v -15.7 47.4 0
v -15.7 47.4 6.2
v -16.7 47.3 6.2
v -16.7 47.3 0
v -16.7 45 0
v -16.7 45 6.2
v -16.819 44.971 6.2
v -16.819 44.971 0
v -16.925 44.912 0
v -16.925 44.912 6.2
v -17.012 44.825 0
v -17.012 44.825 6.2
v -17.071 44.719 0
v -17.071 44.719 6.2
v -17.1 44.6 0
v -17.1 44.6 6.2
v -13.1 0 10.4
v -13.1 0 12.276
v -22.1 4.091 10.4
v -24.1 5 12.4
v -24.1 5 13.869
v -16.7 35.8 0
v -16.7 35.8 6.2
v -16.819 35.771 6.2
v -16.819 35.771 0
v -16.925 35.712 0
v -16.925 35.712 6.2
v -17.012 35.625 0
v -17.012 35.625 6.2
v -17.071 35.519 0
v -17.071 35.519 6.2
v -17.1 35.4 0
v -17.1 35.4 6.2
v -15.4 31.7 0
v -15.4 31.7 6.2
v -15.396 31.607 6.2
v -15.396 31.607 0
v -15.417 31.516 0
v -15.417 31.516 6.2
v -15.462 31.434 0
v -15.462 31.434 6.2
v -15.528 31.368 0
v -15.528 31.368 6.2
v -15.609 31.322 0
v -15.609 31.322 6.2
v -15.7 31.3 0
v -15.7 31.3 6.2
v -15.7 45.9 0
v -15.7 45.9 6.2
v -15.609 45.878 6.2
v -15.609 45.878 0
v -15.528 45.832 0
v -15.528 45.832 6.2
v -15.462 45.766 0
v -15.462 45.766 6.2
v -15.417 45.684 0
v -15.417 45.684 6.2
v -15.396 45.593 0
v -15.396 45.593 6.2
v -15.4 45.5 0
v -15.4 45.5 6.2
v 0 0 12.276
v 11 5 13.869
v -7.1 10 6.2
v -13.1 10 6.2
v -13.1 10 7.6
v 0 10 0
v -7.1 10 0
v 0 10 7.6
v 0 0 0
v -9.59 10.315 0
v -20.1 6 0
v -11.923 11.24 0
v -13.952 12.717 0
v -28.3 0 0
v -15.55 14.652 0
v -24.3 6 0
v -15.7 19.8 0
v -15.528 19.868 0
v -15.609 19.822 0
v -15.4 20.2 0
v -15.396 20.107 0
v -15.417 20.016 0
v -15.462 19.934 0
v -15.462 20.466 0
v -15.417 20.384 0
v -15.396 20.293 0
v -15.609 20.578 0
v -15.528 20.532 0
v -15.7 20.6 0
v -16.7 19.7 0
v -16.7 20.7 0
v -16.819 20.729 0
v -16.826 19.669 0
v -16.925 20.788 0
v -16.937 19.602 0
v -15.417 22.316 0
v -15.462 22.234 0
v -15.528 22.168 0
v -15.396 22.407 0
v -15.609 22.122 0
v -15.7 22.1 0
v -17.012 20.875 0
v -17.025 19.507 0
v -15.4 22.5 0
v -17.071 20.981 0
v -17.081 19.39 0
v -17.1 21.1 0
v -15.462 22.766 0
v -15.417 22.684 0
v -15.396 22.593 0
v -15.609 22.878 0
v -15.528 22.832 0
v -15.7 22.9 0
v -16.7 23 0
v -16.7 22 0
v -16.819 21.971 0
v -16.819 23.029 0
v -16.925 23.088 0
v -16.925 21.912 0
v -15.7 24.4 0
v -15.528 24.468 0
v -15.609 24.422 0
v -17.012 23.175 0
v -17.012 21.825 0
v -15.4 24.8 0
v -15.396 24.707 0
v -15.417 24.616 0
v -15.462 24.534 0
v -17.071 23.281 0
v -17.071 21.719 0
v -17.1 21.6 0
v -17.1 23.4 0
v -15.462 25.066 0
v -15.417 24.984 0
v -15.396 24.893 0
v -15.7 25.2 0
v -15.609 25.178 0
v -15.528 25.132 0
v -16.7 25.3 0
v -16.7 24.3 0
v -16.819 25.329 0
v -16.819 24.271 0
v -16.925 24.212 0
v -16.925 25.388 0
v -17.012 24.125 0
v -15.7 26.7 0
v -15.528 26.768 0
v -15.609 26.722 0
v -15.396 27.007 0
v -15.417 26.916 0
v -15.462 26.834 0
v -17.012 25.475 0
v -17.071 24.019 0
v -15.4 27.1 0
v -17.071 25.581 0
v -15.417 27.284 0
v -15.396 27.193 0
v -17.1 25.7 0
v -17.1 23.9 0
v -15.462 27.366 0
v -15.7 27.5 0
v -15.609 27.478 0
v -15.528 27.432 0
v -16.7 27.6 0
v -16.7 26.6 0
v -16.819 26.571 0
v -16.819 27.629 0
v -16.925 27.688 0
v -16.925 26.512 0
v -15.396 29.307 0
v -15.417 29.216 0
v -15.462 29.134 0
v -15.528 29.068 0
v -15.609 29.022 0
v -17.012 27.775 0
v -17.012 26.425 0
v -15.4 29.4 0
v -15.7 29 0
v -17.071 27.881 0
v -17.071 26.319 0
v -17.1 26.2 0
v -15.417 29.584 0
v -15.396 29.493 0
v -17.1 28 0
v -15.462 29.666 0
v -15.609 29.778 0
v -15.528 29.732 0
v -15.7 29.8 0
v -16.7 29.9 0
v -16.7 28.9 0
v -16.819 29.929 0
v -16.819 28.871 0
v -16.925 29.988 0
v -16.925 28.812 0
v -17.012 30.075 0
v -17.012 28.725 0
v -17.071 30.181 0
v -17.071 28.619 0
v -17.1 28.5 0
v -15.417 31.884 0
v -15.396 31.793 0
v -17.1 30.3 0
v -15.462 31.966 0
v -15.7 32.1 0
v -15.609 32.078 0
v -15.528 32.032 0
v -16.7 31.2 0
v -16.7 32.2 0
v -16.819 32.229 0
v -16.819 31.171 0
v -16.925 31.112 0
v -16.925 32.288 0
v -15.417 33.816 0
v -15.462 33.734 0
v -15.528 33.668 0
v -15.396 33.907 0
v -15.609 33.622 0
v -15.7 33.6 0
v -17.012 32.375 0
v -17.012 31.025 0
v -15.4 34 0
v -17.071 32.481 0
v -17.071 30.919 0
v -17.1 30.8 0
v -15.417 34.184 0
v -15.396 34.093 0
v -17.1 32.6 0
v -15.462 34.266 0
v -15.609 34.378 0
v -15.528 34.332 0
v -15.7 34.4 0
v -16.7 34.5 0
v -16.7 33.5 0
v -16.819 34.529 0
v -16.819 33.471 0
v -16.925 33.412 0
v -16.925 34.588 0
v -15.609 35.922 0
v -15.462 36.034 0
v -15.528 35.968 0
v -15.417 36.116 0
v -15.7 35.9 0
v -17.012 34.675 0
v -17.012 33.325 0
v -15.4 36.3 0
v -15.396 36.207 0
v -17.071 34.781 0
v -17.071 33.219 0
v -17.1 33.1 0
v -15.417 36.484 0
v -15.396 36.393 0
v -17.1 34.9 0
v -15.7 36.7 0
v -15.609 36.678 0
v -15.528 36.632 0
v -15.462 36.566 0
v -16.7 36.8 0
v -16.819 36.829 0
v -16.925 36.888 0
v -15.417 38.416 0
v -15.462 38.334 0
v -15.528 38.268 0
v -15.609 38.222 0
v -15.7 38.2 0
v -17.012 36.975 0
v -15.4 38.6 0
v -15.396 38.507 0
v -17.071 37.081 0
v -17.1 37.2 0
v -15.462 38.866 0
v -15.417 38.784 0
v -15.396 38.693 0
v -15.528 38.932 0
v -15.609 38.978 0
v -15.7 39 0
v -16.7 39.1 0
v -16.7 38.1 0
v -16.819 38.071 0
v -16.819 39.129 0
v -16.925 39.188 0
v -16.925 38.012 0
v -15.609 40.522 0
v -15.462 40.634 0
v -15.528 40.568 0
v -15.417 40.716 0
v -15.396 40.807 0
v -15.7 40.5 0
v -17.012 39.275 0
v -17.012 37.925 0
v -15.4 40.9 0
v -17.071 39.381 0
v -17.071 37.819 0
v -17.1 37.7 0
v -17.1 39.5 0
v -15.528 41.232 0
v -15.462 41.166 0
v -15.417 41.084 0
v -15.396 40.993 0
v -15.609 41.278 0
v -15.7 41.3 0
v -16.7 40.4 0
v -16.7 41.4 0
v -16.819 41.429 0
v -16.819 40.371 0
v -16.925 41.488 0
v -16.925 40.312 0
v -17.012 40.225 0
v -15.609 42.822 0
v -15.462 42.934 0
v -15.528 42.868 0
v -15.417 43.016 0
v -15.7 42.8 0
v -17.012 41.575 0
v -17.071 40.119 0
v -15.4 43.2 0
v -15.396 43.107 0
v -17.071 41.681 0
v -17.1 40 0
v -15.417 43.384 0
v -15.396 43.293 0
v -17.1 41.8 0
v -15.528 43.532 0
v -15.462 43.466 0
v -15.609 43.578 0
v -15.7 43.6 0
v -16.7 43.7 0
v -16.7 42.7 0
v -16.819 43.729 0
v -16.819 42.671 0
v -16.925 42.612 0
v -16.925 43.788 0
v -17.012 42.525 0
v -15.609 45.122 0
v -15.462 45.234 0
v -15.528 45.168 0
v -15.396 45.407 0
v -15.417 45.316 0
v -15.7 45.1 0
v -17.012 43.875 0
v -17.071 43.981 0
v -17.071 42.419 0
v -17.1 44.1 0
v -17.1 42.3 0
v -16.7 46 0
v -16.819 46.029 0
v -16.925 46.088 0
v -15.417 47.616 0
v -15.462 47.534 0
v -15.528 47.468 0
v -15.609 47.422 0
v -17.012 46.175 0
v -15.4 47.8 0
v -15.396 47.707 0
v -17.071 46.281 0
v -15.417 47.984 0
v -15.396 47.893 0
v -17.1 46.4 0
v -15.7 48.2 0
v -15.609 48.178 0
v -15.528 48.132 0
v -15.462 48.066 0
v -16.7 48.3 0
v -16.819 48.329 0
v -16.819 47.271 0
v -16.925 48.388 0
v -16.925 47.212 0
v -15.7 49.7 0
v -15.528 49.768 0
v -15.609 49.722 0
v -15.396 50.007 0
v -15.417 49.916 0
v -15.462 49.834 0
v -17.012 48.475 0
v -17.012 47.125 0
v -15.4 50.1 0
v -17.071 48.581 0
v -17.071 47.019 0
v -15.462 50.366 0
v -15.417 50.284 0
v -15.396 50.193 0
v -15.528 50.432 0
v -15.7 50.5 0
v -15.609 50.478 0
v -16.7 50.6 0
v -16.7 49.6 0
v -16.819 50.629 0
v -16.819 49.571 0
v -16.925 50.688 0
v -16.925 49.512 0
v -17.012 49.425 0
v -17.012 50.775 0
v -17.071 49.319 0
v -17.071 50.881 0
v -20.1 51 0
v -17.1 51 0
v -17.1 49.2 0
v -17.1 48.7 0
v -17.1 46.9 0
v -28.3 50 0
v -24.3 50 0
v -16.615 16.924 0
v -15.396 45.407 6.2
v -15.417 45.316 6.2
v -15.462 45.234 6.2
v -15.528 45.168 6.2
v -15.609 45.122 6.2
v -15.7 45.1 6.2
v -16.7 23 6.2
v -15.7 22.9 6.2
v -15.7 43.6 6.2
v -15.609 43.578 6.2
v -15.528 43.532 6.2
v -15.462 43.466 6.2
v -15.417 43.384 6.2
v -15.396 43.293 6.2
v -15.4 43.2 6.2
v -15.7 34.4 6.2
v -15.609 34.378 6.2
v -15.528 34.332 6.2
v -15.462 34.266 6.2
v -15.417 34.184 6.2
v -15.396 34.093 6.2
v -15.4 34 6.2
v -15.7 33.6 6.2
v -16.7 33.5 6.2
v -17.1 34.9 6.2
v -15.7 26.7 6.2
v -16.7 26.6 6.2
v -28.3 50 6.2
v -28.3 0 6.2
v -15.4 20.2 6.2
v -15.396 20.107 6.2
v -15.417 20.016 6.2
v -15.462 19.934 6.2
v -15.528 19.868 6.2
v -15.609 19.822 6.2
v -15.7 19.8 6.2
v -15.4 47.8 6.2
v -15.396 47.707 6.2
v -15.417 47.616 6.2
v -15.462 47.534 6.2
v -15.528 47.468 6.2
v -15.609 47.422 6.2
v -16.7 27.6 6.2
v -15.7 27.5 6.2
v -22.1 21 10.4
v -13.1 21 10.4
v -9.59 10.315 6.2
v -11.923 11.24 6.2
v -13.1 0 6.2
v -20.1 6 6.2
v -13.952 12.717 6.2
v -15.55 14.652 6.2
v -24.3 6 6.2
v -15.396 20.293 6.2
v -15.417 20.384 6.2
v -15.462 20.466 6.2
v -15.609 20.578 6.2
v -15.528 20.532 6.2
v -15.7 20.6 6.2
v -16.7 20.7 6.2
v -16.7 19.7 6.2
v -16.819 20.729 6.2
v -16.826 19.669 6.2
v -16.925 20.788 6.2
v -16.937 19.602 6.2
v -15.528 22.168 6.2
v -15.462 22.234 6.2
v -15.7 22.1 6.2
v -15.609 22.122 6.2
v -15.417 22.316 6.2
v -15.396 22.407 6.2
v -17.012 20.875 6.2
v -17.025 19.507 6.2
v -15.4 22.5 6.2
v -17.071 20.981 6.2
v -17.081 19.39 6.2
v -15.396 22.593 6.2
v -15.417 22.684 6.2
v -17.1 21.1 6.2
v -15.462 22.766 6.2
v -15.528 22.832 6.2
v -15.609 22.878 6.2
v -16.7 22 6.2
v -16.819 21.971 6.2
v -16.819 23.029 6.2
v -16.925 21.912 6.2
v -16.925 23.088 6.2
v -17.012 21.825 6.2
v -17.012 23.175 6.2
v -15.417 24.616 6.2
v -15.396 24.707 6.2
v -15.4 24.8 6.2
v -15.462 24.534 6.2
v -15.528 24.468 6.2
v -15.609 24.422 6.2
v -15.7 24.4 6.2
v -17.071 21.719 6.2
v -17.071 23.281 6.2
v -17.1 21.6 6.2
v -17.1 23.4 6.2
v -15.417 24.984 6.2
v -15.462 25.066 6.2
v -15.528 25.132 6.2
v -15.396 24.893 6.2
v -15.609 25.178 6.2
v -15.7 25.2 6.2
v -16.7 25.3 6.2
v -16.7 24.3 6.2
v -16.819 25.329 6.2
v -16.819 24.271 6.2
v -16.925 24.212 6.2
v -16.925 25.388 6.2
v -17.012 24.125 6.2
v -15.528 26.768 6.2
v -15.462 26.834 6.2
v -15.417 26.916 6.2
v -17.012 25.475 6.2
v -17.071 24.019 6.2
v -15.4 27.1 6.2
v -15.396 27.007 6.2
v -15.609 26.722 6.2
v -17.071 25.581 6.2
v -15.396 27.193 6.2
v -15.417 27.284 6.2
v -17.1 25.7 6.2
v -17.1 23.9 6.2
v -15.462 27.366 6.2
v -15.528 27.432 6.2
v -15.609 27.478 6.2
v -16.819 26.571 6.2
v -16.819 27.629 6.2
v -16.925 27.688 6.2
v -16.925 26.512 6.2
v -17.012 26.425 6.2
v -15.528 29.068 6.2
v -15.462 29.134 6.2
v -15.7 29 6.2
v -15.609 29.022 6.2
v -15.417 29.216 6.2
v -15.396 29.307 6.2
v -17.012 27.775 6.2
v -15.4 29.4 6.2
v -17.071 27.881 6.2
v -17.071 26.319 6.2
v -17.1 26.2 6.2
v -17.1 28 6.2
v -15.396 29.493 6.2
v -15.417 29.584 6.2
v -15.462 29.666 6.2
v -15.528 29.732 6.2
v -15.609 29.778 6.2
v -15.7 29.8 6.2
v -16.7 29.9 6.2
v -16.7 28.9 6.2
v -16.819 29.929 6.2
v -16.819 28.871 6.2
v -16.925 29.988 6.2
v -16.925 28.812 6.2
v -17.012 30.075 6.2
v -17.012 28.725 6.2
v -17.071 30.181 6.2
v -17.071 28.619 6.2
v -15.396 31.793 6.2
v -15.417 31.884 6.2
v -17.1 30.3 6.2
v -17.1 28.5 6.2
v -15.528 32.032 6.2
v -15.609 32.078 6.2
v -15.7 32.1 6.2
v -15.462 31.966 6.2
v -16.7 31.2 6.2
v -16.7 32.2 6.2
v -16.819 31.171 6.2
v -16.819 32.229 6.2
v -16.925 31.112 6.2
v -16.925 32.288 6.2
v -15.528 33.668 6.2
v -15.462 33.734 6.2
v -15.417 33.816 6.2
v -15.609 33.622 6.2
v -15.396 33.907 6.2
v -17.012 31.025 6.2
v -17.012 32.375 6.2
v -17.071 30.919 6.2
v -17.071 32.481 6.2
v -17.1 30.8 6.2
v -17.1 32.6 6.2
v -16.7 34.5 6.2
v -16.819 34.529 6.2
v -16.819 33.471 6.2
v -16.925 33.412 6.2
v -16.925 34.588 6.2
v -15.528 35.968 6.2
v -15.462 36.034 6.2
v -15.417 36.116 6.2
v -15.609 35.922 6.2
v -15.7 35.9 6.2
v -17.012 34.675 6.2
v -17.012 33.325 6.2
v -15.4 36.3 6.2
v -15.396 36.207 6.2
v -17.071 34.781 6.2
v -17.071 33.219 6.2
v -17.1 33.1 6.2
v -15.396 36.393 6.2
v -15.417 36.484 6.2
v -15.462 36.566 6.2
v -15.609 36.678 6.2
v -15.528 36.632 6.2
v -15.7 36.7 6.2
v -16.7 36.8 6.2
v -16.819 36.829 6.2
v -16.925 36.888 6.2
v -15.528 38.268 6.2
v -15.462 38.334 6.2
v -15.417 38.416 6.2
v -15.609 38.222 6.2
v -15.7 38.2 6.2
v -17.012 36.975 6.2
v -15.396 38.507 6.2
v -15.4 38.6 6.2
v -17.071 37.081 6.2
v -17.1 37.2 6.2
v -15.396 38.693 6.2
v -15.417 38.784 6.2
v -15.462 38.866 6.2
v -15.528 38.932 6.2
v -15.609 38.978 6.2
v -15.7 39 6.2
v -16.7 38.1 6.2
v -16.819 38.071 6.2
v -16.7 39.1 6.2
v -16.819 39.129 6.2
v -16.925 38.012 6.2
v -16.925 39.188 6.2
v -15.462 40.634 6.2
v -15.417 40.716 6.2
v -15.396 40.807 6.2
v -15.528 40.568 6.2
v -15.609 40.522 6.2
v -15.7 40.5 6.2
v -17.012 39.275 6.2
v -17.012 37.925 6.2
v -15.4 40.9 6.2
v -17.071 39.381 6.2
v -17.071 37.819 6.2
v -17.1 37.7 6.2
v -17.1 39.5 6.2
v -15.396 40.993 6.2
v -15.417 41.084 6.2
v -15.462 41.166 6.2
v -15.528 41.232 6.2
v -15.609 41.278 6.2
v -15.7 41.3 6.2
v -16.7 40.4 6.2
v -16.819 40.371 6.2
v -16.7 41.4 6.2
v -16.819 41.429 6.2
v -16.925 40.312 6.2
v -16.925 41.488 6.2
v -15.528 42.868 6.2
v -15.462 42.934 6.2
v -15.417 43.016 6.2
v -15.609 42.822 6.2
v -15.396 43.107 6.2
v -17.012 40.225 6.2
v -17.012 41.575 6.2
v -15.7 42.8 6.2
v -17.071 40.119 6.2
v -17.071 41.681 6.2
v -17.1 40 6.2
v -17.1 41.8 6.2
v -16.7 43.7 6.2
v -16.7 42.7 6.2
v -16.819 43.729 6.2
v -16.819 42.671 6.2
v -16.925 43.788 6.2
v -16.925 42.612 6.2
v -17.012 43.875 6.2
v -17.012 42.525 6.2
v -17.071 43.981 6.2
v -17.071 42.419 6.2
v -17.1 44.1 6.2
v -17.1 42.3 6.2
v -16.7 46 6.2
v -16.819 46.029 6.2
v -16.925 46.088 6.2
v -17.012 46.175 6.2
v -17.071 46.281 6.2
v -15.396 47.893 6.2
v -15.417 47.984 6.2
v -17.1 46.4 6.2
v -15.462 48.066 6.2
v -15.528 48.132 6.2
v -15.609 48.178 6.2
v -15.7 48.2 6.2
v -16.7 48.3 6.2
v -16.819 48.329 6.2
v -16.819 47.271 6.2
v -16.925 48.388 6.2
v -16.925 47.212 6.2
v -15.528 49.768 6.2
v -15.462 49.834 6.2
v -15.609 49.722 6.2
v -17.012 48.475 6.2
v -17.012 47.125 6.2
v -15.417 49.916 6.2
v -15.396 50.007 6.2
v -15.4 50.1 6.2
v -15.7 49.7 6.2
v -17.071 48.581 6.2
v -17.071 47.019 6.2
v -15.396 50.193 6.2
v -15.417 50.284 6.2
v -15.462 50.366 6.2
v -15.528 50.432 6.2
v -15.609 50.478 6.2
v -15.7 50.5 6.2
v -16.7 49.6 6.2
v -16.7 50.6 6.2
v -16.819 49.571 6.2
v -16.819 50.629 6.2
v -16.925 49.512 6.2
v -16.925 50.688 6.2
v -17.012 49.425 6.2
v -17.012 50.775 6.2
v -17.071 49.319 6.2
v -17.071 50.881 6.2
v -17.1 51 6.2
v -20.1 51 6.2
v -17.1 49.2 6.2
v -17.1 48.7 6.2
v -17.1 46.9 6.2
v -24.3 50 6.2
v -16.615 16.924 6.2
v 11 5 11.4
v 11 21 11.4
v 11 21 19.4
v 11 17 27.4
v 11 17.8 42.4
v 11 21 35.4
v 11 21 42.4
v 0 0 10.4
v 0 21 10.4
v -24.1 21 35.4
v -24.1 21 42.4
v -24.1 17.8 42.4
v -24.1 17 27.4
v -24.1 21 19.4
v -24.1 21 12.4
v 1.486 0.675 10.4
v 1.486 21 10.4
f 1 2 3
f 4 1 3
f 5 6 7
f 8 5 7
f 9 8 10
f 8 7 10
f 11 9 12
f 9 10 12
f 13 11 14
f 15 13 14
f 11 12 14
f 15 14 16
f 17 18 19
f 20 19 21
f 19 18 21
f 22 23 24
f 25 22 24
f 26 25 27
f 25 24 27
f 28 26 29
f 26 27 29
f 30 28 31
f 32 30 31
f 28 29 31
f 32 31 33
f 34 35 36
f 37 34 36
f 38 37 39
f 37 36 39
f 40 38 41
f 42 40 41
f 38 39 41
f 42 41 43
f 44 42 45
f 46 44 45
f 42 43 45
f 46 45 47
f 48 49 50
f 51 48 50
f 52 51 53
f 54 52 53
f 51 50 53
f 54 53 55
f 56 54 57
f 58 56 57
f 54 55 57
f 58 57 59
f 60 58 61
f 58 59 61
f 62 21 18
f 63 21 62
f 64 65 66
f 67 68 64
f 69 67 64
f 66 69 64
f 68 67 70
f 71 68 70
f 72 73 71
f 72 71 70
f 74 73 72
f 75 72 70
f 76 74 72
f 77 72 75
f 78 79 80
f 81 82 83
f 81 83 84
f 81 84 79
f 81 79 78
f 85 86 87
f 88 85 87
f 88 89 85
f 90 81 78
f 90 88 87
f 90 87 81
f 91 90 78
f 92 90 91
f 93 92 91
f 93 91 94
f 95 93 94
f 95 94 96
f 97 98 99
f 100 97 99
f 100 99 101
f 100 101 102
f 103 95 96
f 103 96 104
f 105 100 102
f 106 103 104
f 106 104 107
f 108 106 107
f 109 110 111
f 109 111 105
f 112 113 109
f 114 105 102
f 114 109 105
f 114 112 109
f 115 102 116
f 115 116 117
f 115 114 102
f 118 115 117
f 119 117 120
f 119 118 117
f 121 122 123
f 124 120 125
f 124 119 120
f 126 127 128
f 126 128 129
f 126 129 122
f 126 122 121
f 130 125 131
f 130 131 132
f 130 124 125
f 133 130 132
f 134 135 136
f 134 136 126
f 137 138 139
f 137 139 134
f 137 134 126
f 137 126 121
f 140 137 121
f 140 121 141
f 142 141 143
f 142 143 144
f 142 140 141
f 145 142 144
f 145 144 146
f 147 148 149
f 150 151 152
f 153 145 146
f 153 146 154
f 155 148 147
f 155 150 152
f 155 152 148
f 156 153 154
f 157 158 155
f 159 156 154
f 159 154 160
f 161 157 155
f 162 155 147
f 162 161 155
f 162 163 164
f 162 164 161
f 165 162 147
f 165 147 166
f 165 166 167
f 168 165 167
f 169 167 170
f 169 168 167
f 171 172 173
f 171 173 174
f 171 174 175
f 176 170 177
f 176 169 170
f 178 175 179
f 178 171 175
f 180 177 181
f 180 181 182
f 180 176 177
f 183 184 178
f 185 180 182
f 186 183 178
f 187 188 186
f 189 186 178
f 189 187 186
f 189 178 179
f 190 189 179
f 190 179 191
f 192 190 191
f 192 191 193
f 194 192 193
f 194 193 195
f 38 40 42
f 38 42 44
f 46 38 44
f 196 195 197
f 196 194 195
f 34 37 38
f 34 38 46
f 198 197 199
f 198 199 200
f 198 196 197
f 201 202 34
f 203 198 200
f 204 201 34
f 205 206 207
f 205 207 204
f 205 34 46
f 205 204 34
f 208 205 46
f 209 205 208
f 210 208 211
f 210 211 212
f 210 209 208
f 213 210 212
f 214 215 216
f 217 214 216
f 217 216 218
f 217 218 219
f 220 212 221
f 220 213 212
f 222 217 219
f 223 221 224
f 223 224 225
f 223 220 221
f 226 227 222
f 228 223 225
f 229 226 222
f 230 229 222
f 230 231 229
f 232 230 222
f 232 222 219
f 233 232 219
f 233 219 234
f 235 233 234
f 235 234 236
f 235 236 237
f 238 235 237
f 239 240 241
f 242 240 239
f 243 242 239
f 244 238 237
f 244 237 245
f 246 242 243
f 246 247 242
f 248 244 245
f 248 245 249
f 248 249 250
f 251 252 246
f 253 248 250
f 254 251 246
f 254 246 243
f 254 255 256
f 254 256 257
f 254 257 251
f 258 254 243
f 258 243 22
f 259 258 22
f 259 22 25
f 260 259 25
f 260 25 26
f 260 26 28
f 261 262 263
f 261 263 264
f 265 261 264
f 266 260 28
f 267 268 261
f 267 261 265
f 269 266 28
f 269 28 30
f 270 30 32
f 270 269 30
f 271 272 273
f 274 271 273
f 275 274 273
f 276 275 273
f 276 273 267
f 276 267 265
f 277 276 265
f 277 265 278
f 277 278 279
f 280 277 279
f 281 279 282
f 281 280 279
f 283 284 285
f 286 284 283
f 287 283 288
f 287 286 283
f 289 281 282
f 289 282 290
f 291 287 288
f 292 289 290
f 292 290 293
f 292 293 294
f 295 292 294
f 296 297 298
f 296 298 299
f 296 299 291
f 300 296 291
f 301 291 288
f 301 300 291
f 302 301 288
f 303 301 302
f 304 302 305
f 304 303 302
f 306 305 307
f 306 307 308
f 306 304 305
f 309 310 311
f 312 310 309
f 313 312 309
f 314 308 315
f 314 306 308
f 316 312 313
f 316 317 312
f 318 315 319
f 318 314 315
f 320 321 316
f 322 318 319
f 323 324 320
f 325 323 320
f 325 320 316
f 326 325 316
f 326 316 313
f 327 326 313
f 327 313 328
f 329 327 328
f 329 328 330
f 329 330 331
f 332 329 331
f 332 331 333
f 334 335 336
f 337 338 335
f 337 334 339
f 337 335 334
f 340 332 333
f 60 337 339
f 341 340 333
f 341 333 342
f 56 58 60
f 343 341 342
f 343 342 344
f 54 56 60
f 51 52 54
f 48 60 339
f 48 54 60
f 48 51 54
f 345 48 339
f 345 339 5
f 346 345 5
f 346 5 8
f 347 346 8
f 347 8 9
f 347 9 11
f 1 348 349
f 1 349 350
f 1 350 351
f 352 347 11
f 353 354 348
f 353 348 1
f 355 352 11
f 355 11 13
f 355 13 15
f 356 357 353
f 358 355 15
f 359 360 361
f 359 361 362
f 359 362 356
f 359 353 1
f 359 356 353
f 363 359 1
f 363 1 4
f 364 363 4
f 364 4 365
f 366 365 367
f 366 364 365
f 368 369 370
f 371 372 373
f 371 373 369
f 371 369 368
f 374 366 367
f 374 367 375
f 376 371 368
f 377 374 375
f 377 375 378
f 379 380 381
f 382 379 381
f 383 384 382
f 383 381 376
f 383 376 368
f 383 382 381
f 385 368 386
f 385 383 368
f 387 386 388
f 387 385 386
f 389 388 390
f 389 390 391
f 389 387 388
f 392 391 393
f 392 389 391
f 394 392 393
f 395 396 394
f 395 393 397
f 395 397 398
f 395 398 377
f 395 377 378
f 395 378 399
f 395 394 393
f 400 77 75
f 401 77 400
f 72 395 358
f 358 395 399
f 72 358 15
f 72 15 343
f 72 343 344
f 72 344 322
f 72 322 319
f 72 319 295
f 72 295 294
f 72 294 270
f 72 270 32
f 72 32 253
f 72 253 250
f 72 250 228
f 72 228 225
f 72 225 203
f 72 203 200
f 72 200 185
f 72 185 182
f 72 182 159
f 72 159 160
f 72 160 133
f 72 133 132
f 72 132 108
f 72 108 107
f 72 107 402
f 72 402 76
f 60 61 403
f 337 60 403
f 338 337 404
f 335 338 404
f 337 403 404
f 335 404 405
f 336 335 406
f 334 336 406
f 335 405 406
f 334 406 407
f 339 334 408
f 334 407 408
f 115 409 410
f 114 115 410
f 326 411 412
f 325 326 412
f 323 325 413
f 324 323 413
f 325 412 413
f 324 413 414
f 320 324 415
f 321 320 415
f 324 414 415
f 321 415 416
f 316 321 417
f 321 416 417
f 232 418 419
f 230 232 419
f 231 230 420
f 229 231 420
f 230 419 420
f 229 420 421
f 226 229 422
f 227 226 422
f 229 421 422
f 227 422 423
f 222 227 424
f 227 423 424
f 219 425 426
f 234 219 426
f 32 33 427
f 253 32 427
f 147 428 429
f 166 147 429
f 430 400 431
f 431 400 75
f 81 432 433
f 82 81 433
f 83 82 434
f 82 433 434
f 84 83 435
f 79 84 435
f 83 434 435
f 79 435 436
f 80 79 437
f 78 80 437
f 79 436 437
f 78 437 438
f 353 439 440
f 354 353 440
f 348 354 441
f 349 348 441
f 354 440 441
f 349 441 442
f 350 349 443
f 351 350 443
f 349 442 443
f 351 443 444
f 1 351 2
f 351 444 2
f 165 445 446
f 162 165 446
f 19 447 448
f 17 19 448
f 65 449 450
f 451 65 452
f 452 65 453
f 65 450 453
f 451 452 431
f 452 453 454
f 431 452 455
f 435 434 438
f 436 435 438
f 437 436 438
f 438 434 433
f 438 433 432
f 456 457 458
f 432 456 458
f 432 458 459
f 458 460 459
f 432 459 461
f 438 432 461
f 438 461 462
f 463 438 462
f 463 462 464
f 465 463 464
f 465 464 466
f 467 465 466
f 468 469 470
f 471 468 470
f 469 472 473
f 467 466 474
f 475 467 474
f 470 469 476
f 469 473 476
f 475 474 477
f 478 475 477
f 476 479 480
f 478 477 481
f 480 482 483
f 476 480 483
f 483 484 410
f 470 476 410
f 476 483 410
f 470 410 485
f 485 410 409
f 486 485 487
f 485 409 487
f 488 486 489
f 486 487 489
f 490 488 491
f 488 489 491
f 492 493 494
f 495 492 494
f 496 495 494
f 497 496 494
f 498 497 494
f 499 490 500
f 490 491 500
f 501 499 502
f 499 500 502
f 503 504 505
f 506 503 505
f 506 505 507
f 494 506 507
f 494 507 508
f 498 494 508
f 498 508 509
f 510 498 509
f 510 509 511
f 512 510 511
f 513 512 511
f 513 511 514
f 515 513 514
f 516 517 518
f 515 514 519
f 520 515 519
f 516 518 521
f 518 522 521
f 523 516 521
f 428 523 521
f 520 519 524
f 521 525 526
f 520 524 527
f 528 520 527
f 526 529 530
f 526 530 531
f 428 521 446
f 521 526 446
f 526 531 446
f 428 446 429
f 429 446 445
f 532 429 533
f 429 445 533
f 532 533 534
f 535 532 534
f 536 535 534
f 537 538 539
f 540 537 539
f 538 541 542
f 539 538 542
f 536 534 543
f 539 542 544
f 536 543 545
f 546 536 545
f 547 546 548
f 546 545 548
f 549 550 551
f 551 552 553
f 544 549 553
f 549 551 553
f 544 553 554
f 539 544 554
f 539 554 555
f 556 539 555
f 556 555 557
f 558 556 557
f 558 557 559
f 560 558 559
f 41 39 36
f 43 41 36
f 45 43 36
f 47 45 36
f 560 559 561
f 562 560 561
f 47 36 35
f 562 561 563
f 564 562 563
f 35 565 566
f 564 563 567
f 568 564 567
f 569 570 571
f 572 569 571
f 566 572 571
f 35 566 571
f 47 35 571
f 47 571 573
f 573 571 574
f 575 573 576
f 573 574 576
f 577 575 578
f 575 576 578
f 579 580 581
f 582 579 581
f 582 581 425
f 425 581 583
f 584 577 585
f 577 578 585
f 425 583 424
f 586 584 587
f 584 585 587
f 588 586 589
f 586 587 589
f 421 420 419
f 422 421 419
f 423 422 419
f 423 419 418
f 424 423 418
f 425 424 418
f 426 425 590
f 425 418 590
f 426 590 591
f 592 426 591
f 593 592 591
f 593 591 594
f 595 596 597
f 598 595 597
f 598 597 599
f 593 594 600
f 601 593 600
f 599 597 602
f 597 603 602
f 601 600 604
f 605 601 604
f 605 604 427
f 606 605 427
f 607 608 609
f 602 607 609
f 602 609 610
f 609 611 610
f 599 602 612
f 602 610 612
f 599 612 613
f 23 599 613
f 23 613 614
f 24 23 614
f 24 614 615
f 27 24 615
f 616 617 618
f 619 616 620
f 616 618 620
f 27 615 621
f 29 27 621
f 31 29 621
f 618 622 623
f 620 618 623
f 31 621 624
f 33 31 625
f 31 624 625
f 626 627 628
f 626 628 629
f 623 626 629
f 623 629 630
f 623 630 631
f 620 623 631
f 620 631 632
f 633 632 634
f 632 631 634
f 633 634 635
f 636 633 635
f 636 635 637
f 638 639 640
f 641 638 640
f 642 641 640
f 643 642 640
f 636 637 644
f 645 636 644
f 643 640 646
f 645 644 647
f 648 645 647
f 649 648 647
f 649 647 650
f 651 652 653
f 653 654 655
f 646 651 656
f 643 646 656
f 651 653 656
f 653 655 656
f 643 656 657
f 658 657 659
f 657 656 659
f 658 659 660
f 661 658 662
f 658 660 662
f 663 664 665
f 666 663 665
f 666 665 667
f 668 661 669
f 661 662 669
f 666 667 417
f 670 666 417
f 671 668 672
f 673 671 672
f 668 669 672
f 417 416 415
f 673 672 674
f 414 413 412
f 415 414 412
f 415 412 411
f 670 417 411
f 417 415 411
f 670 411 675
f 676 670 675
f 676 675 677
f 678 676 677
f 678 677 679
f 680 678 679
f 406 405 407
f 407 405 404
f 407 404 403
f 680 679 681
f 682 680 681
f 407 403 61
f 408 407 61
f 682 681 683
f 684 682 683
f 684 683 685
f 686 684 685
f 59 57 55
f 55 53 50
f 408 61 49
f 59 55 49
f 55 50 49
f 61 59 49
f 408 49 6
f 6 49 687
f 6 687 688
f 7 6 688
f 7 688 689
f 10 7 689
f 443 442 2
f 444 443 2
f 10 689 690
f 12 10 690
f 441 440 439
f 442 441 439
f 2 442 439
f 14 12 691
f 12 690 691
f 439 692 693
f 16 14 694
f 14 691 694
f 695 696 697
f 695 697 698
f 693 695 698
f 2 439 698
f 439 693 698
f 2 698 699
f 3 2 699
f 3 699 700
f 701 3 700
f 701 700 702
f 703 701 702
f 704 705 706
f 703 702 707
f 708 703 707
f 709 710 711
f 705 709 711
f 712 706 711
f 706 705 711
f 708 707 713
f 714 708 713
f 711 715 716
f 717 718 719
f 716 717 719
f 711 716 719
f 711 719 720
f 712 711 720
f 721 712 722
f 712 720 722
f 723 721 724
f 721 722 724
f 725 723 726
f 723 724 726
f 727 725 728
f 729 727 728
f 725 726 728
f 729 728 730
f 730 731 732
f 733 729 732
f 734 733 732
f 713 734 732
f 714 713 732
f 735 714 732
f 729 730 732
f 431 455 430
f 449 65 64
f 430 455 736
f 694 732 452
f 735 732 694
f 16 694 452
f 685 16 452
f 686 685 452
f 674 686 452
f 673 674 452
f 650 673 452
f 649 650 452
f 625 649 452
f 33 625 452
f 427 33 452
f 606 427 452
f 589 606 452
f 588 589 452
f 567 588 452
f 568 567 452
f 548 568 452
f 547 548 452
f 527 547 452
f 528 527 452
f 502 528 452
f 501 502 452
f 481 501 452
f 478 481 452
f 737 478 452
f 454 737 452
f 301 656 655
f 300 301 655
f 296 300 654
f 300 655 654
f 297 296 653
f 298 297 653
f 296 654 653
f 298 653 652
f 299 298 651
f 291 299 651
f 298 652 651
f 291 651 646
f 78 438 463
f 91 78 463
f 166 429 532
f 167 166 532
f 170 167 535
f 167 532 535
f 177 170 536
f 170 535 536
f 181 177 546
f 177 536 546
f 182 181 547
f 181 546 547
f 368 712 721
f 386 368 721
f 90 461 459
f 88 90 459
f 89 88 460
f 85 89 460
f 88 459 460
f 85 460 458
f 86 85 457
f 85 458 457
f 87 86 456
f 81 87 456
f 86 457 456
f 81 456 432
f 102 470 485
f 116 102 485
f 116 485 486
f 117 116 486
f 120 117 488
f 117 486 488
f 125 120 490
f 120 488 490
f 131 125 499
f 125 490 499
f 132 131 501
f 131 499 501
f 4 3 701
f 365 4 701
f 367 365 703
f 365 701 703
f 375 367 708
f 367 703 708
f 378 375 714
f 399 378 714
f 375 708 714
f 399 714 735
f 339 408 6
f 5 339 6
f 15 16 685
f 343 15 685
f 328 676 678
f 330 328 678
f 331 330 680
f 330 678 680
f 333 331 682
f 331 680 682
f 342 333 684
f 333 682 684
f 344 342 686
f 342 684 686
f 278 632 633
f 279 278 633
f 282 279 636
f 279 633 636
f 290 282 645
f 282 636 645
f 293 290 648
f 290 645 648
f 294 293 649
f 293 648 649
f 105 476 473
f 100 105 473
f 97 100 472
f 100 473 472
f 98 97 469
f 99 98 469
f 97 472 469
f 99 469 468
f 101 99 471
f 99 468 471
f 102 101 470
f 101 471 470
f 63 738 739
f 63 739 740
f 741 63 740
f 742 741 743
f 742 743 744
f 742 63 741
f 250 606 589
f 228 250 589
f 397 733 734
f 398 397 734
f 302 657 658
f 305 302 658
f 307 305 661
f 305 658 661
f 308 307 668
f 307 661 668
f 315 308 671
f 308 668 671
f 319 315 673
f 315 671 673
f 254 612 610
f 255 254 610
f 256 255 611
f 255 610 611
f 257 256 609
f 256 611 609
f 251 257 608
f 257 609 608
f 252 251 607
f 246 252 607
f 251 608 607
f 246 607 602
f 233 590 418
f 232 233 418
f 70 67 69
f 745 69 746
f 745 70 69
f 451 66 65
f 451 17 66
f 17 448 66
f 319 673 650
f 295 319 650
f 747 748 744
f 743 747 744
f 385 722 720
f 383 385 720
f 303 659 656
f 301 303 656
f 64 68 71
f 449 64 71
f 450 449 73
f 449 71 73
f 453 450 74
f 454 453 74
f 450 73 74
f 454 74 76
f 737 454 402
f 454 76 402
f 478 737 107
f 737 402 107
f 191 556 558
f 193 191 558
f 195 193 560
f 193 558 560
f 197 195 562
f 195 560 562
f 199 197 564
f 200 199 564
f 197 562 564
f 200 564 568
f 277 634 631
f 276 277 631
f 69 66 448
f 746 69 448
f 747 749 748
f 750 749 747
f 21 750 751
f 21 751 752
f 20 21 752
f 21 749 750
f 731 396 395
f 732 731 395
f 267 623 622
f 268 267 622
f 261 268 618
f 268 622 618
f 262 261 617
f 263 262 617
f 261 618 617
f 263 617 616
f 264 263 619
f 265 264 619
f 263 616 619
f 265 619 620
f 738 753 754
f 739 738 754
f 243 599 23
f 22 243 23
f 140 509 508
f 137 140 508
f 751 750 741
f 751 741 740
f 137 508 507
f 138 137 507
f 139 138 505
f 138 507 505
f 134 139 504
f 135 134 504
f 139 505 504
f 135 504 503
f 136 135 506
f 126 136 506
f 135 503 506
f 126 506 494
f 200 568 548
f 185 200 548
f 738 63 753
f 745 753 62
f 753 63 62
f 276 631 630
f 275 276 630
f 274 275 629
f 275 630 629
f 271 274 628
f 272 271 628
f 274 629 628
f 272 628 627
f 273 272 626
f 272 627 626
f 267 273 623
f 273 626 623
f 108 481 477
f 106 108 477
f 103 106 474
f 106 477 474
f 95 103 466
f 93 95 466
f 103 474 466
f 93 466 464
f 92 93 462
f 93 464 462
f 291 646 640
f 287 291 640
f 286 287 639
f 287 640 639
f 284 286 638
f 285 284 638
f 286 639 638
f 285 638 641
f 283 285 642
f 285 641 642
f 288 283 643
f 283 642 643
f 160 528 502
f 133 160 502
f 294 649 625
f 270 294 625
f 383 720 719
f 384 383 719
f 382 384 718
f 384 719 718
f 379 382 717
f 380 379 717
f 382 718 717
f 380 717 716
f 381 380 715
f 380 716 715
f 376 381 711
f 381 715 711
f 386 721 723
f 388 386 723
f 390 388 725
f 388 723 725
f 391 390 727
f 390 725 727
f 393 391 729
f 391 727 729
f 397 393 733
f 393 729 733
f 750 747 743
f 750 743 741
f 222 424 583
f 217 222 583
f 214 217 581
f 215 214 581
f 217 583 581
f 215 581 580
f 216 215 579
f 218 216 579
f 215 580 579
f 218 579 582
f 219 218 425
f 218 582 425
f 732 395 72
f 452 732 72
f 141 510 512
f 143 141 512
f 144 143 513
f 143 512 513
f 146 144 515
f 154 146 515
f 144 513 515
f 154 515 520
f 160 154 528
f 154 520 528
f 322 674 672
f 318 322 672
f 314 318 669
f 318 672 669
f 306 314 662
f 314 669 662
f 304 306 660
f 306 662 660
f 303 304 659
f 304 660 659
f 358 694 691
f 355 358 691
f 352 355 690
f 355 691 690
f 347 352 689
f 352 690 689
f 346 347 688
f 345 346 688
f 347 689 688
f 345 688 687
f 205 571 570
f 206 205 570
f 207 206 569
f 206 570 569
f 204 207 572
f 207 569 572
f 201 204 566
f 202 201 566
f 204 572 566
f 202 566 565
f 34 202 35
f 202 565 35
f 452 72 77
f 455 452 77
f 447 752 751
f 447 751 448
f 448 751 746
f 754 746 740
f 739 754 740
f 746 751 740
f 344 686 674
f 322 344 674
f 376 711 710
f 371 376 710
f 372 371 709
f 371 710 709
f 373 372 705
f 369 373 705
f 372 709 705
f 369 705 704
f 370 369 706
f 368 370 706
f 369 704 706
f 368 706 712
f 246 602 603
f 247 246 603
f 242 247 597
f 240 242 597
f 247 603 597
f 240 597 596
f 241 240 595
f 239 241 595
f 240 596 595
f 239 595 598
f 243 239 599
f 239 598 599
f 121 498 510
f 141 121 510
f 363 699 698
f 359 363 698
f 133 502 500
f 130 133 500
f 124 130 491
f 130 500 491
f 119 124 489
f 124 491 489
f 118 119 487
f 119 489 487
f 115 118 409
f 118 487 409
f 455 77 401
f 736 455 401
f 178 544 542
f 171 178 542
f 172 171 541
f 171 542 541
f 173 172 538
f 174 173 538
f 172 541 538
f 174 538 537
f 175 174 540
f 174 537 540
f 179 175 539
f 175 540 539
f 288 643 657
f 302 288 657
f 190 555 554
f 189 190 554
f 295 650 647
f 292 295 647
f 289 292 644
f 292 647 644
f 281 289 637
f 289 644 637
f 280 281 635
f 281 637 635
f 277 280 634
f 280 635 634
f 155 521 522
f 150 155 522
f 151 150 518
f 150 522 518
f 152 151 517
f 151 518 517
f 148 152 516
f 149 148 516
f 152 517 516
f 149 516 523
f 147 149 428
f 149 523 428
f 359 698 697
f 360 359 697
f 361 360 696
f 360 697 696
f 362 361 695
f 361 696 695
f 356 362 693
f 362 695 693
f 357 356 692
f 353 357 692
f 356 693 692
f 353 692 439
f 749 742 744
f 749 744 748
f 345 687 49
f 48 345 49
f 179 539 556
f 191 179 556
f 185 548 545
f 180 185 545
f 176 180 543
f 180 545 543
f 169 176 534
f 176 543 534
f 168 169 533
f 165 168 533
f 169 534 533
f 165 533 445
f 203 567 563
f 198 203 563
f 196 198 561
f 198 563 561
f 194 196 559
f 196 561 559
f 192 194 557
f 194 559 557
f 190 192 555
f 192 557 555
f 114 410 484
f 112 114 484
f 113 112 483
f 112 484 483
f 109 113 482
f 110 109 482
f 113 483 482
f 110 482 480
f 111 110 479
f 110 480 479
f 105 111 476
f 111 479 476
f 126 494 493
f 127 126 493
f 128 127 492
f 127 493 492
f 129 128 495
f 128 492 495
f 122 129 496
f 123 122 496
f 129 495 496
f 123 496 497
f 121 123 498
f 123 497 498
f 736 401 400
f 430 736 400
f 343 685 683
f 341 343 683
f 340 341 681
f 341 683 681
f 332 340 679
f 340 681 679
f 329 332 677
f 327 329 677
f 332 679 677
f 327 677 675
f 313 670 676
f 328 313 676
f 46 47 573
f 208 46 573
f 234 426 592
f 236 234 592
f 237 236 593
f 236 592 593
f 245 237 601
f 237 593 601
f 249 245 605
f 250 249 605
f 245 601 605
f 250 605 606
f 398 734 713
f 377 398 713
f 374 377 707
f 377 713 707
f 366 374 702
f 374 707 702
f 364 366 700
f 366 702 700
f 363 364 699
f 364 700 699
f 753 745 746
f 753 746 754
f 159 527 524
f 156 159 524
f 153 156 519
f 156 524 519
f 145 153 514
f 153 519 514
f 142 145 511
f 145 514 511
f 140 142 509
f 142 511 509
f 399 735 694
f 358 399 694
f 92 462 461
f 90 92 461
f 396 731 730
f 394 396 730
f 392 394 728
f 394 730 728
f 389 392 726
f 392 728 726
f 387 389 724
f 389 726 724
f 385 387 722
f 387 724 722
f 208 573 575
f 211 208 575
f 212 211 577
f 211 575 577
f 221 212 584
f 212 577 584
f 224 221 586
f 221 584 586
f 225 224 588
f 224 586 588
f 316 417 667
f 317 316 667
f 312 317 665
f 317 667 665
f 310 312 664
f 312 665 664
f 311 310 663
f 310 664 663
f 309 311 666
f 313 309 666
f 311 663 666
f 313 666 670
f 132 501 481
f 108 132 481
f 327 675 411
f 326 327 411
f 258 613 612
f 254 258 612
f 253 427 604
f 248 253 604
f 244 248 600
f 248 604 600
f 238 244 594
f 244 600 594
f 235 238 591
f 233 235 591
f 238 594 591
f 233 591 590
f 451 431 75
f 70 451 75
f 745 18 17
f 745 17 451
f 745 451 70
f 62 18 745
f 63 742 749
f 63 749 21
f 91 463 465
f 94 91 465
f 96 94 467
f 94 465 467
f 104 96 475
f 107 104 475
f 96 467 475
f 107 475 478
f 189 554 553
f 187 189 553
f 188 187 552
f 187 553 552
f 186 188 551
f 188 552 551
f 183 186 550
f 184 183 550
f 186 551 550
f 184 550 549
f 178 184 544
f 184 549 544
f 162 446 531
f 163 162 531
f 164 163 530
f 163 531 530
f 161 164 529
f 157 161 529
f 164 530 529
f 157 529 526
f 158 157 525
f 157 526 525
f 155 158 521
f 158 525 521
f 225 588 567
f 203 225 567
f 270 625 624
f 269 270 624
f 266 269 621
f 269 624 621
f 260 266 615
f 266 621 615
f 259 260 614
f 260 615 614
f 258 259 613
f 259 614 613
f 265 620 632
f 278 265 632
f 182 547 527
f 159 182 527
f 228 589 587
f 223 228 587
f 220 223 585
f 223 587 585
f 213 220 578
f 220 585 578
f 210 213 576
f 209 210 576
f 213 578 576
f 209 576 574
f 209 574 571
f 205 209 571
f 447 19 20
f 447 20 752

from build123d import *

# Parameters (mm, degrees)
BOSS_EXTRUDE1_DEPTH = 6.2
BOSS_EXTRUDE2_DEPTH = 21
CHAMFER1_SIZE       = 5
CHAMFER1_SIZE2      = 28.356409098
CUT_EXTRUDE1_REACH  = 74.109
CHAMFER2_SIZE       = 1
CHAMFER2_SIZE2      = 9.514364454
CHAMFER3_SIZE       = 2
CUT_EXTRUDE2_REACH  = 79.092
CUT_EXTRUDE3_START  = -3.468867
CUT_EXTRUDE3_DEPTH  = 3.468867
BOSS_EXTRUDE3_DEPTH = 6.2
CUT_EXTRUDE4_REACH  = 79.092


with BuildPart() as part:
    # Sketch1 → Boss-Extrude1 (new body)
    with BuildSketch(Plane.XY):
        with BuildLine():
            Line((-28.3, 0), (0, 0))
            Line((0, 0), (0, 10))
            Line((0, 10), (-7.1, 10))
            ThreePointArc((-7.1, 10), (-14.171067812, 12.928932188), (-17.1, 20))
            Line((-17.1, 20), (-17.1, 51))
            Line((-17.1, 51), (-20.1, 51))
            Line((-20.1, 51), (-20.1, 6))
            Line((-20.1, 6), (-24.3, 6))
            Line((-24.3, 6), (-24.3, 50))
            Line((-24.3, 50), (-28.3, 50))
            Line((-28.3, 50), (-28.3, 0))
        make_face()
    extrude(amount=BOSS_EXTRUDE1_DEPTH)

    # Sketch2 → Boss-Extrude2 (add)
    with BuildSketch(Plane.XZ):
        Polygon((0, 6.2), (0, 10.4), (11, 10.4), (11, 42.4), (-24.1, 42.4), (-24.1, 10.4), (-13.1, 10.4), (-13.1, 6.2), align=None)
    extrude(amount=-BOSS_EXTRUDE2_DEPTH)

    # Chamfer1
    chamfer1_edges = [part.edges().sort_by_distance(p)[0] for p in [
        (-6.55, 0, 42.4),
    ]]
    chamfer1_side = [part.faces().sort_by_distance(p)[0] for p in [
        (-6.55, 10.5, 42.4),
    ]]
    chamfer(chamfer1_edges, length=CHAMFER1_SIZE, length2=CHAMFER1_SIZE2, reference=chamfer1_side[0])

    # Sketch3 → Cut-Extrude1 (cut, up to next)
    with BuildSketch(Plane(origin=(0, 0, 0), x_dir=(0, 0, -1), z_dir=(1, 0, 0)), mode=Mode.PRIVATE) as cut_extrude1_sk1:
        Polygon((-6.2, 10), (-7.6, 10), (-10.4, 21), (-6.2, 21), align=None)
    cut_extrude1_tool1 = extrude(cut_extrude1_sk1.sketch, amount=-CUT_EXTRUDE1_REACH, mode=Mode.PRIVATE) & part.part
    add(cut_extrude1_tool1.solids().sort_by_distance((0, 16.416667, 7.716667))[0], mode=Mode.SUBTRACT)

    # Chamfer2
    chamfer2_edges = [part.edges().sort_by_distance(p)[0] for p in [
        (11, 10.5, 10.4),
    ]]
    chamfer2_side = [part.faces().sort_by_distance(p)[0] for p in [
        (11, 11.541747932, 25.62778603),
    ]]
    chamfer(chamfer2_edges, length=CHAMFER2_SIZE, length2=CHAMFER2_SIZE2, reference=chamfer2_side[0])

    # Chamfer3
    chamfer3_edges = [part.edges().sort_by_distance(p)[0] for p in [
        (-24.1, 10.5, 10.4),
    ]]
    chamfer(chamfer3_edges, length=CHAMFER3_SIZE)

    # Sketch5 → Cut-Extrude2 (cut, up to next)
    with BuildSketch(Plane(origin=(11, 0, 0), x_dir=(0, 0, -1), z_dir=(1, 0, 0)), mode=Mode.PRIVATE) as cut_extrude2_sk1:
        Polygon((-42.4, 17.8), (-13.86886709, 5), (-10.966215349, -4.108657177), (-44.036924755, 0.937700744), align=None)
    cut_extrude2_tool1 = extrude(cut_extrude2_sk1.sketch, amount=-CUT_EXTRUDE2_REACH, mode=Mode.PRIVATE) & part.part
    add(cut_extrude2_tool1.solids().sort_by_distance((11, 5.258773, 29.627692))[0], mode=Mode.SUBTRACT)

    # Sketch6 → Cut-Extrude3 (cut)
    with BuildSketch(Plane(origin=(0, 0, 10.4), x_dir=(-1, 0, 0), z_dir=(0, 0, -1)).offset(CUT_EXTRUDE3_START)):
        Polygon((13.1, 0), (24.1, 5), (37.198342989, 5), (28.62602328, -4.522208447), (-13.825974113, -5.629287686), (-20.705007466, 5), (-11, 5), (0, 0), align=None)
    extrude(amount=CUT_EXTRUDE3_DEPTH, mode=Mode.SUBTRACT)

    # Sketch7 → Boss-Extrude3 (add)
    with BuildSketch(Plane.XY.offset(6.2)):
        with BuildLine():
            Line((-16.7, 50.6), (-15.7, 50.5))
            ThreePointArc((-15.7, 50.5), (-15.462165524, 50.365875857), (-15.4, 50.1))
            ThreePointArc((-15.4, 50.1), (-15.462165524, 49.834124143), (-15.7, 49.7))
            Line((-15.7, 49.7), (-16.7, 49.6))
            ThreePointArc((-16.7, 49.6), (-16.971392676, 49.471392676), (-17.1, 49.2))
            Line((-17.1, 49.2), (-17.1, 48.7))
            ThreePointArc((-17.1, 48.7), (-16.971392676, 48.428607324), (-16.7, 48.3))
            Line((-16.7, 48.3), (-15.7, 48.2))
            ThreePointArc((-15.7, 48.2), (-15.462165524, 48.065875857), (-15.4, 47.8))
            ThreePointArc((-15.4, 47.8), (-15.462165524, 47.534124143), (-15.7, 47.4))
            Line((-15.7, 47.4), (-16.7, 47.3))
            ThreePointArc((-16.7, 47.3), (-16.971392676, 47.171392676), (-17.1, 46.9))
            Line((-17.1, 46.9), (-17.1, 46.4))
            ThreePointArc((-17.1, 46.4), (-16.971392676, 46.128607324), (-16.7, 46))
            Line((-16.7, 46), (-15.7, 45.9))
            ThreePointArc((-15.7, 45.9), (-15.462165524, 45.765875857), (-15.4, 45.5))
            ThreePointArc((-15.4, 45.5), (-15.462165524, 45.234124143), (-15.7, 45.1))
            Line((-15.7, 45.1), (-16.7, 45))
            ThreePointArc((-16.7, 45), (-16.971392676, 44.871392676), (-17.1, 44.6))
            Line((-17.1, 44.6), (-17.1, 44.1))
            ThreePointArc((-17.1, 44.1), (-16.971392676, 43.828607324), (-16.7, 43.7))
            Line((-16.7, 43.7), (-15.7, 43.6))
            ThreePointArc((-15.7, 43.6), (-15.462165524, 43.465875857), (-15.4, 43.2))
            ThreePointArc((-15.4, 43.2), (-15.462165524, 42.934124143), (-15.7, 42.8))
            Line((-15.7, 42.8), (-16.7, 42.7))
            ThreePointArc((-16.7, 42.7), (-16.971392676, 42.571392676), (-17.1, 42.3))
            Line((-17.1, 42.3), (-17.1, 41.8))
            ThreePointArc((-17.1, 41.8), (-16.971392676, 41.528607324), (-16.7, 41.4))
            Line((-16.7, 41.4), (-15.7, 41.3))
            ThreePointArc((-15.7, 41.3), (-15.462165524, 41.165875857), (-15.4, 40.9))
            ThreePointArc((-15.4, 40.9), (-15.462165524, 40.634124143), (-15.7, 40.5))
            Line((-15.7, 40.5), (-16.7, 40.4))
            ThreePointArc((-16.7, 40.4), (-16.971392676, 40.271392676), (-17.1, 40))
            Line((-17.1, 40), (-17.1, 39.5))
            ThreePointArc((-17.1, 39.5), (-16.971392676, 39.228607324), (-16.7, 39.1))
            Line((-16.7, 39.1), (-15.7, 39))
            ThreePointArc((-15.7, 39), (-15.462165524, 38.865875857), (-15.4, 38.6))
            ThreePointArc((-15.4, 38.6), (-15.462165524, 38.334124143), (-15.7, 38.2))
            Line((-15.7, 38.2), (-16.7, 38.1))
            ThreePointArc((-16.7, 38.1), (-16.971392676, 37.971392676), (-17.1, 37.7))
            Line((-17.1, 37.7), (-17.1, 37.2))
            ThreePointArc((-17.1, 37.2), (-16.971392676, 36.928607324), (-16.7, 36.8))
            Line((-16.7, 36.8), (-15.7, 36.7))
            ThreePointArc((-15.7, 36.7), (-15.462165524, 36.565875857), (-15.4, 36.3))
            ThreePointArc((-15.4, 36.3), (-15.462165524, 36.034124143), (-15.7, 35.9))
            Line((-15.7, 35.9), (-16.7, 35.8))
            ThreePointArc((-16.7, 35.8), (-16.971392676, 35.671392676), (-17.1, 35.4))
            Line((-17.1, 35.4), (-17.1, 34.9))
            ThreePointArc((-17.1, 34.9), (-16.971392676, 34.628607324), (-16.7, 34.5))
            Line((-16.7, 34.5), (-15.7, 34.4))
            ThreePointArc((-15.7, 34.4), (-15.462165524, 34.265875857), (-15.4, 34))
            ThreePointArc((-15.4, 34), (-15.462165524, 33.734124143), (-15.7, 33.6))
            Line((-15.7, 33.6), (-16.7, 33.5))
            ThreePointArc((-16.7, 33.5), (-16.971392676, 33.371392676), (-17.1, 33.1))
            Line((-17.1, 33.1), (-17.1, 32.6))
            ThreePointArc((-17.1, 32.6), (-16.971392676, 32.328607324), (-16.7, 32.2))
            Line((-16.7, 32.2), (-15.7, 32.1))
            ThreePointArc((-15.7, 32.1), (-15.462165524, 31.965875857), (-15.4, 31.7))
            ThreePointArc((-15.4, 31.7), (-15.462165524, 31.434124143), (-15.7, 31.3))
            Line((-15.7, 31.3), (-16.7, 31.2))
            ThreePointArc((-16.7, 31.2), (-16.971392676, 31.071392676), (-17.1, 30.8))
            Line((-17.1, 30.8), (-17.1, 30.3))
            ThreePointArc((-17.1, 30.3), (-16.971392676, 30.028607324), (-16.7, 29.9))
            Line((-16.7, 29.9), (-15.7, 29.8))
            ThreePointArc((-15.7, 29.8), (-15.462165524, 29.665875857), (-15.4, 29.4))
            ThreePointArc((-15.4, 29.4), (-15.462165524, 29.134124143), (-15.7, 29))
            Line((-15.7, 29), (-16.7, 28.9))
            ThreePointArc((-16.7, 28.9), (-16.971392676, 28.771392676), (-17.1, 28.5))
            Line((-17.1, 28.5), (-17.1, 28))
            ThreePointArc((-17.1, 28), (-16.971392676, 27.728607324), (-16.7, 27.6))
            Line((-16.7, 27.6), (-15.7, 27.5))
            ThreePointArc((-15.7, 27.5), (-15.462165524, 27.365875857), (-15.4, 27.1))
            ThreePointArc((-15.4, 27.1), (-15.462165524, 26.834124143), (-15.7, 26.7))
            Line((-15.7, 26.7), (-16.7, 26.6))
            ThreePointArc((-16.7, 26.6), (-16.971392676, 26.471392676), (-17.1, 26.2))
            Line((-17.1, 26.2), (-17.1, 25.7))
            ThreePointArc((-17.1, 25.7), (-16.971392676, 25.428607324), (-16.7, 25.3))
            Line((-16.7, 25.3), (-15.7, 25.2))
            ThreePointArc((-15.7, 25.2), (-15.462165524, 25.065875857), (-15.4, 24.8))
            ThreePointArc((-15.4, 24.8), (-15.462165524, 24.534124143), (-15.7, 24.4))
            Line((-15.7, 24.4), (-16.7, 24.3))
            ThreePointArc((-16.7, 24.3), (-16.971392676, 24.171392676), (-17.1, 23.9))
            Line((-17.1, 23.9), (-17.1, 23.4))
            ThreePointArc((-17.1, 23.4), (-16.971392676, 23.128607324), (-16.7, 23))
            Line((-16.7, 23), (-15.7, 22.9))
            ThreePointArc((-15.7, 22.9), (-15.462165524, 22.765875857), (-15.4, 22.5))
            ThreePointArc((-15.4, 22.5), (-15.462165524, 22.234124143), (-15.7, 22.1))
            Line((-15.7, 22.1), (-16.7, 22))
            ThreePointArc((-16.7, 22), (-16.971392676, 21.871392676), (-17.1, 21.6))
            Line((-17.1, 21.6), (-17.1, 21.1))
            ThreePointArc((-17.1, 21.1), (-16.971392676, 20.828607324), (-16.7, 20.7))
            Line((-16.7, 20.7), (-15.7, 20.6))
            ThreePointArc((-15.7, 20.6), (-15.462165524, 20.465875857), (-15.4, 20.2))
            ThreePointArc((-15.4, 20.2), (-15.462165524, 19.934124143), (-15.7, 19.8))
            Line((-15.7, 19.8), (-16.7, 19.7))
            ThreePointArc((-16.7, 19.7), (-16.971392676, 19.571392676), (-17.1, 19.3))
            Line((-17.1, 19.3), (-17.1, 18.8))
            Line((-17.1, 18.8), (-18.685, 49.2))
            Line((-18.685, 49.2), (-17.1, 51))
            ThreePointArc((-17.1, 51), (-16.971392676, 50.728607324), (-16.7, 50.6))
        make_face()
    extrude(amount=-BOSS_EXTRUDE3_DEPTH)

    # Sketch8 → Cut-Extrude4 (cut, up to next)
    with BuildSketch(Plane(origin=(11, 0, 0), x_dir=(0, 0, -1), z_dir=(1, 0, 0)), mode=Mode.PRIVATE) as cut_extrude4_sk1:
        Polygon((-35.4, 21), (-27.4, 17), (-19.4, 21), align=None)
    cut_extrude4_tool1 = extrude(cut_extrude4_sk1.sketch, amount=-CUT_EXTRUDE4_REACH, mode=Mode.PRIVATE) & part.part
    add(cut_extrude4_tool1.solids().sort_by_distance((11, 19.666667, 27.4))[0], mode=Mode.SUBTRACT)


solid = part.part
